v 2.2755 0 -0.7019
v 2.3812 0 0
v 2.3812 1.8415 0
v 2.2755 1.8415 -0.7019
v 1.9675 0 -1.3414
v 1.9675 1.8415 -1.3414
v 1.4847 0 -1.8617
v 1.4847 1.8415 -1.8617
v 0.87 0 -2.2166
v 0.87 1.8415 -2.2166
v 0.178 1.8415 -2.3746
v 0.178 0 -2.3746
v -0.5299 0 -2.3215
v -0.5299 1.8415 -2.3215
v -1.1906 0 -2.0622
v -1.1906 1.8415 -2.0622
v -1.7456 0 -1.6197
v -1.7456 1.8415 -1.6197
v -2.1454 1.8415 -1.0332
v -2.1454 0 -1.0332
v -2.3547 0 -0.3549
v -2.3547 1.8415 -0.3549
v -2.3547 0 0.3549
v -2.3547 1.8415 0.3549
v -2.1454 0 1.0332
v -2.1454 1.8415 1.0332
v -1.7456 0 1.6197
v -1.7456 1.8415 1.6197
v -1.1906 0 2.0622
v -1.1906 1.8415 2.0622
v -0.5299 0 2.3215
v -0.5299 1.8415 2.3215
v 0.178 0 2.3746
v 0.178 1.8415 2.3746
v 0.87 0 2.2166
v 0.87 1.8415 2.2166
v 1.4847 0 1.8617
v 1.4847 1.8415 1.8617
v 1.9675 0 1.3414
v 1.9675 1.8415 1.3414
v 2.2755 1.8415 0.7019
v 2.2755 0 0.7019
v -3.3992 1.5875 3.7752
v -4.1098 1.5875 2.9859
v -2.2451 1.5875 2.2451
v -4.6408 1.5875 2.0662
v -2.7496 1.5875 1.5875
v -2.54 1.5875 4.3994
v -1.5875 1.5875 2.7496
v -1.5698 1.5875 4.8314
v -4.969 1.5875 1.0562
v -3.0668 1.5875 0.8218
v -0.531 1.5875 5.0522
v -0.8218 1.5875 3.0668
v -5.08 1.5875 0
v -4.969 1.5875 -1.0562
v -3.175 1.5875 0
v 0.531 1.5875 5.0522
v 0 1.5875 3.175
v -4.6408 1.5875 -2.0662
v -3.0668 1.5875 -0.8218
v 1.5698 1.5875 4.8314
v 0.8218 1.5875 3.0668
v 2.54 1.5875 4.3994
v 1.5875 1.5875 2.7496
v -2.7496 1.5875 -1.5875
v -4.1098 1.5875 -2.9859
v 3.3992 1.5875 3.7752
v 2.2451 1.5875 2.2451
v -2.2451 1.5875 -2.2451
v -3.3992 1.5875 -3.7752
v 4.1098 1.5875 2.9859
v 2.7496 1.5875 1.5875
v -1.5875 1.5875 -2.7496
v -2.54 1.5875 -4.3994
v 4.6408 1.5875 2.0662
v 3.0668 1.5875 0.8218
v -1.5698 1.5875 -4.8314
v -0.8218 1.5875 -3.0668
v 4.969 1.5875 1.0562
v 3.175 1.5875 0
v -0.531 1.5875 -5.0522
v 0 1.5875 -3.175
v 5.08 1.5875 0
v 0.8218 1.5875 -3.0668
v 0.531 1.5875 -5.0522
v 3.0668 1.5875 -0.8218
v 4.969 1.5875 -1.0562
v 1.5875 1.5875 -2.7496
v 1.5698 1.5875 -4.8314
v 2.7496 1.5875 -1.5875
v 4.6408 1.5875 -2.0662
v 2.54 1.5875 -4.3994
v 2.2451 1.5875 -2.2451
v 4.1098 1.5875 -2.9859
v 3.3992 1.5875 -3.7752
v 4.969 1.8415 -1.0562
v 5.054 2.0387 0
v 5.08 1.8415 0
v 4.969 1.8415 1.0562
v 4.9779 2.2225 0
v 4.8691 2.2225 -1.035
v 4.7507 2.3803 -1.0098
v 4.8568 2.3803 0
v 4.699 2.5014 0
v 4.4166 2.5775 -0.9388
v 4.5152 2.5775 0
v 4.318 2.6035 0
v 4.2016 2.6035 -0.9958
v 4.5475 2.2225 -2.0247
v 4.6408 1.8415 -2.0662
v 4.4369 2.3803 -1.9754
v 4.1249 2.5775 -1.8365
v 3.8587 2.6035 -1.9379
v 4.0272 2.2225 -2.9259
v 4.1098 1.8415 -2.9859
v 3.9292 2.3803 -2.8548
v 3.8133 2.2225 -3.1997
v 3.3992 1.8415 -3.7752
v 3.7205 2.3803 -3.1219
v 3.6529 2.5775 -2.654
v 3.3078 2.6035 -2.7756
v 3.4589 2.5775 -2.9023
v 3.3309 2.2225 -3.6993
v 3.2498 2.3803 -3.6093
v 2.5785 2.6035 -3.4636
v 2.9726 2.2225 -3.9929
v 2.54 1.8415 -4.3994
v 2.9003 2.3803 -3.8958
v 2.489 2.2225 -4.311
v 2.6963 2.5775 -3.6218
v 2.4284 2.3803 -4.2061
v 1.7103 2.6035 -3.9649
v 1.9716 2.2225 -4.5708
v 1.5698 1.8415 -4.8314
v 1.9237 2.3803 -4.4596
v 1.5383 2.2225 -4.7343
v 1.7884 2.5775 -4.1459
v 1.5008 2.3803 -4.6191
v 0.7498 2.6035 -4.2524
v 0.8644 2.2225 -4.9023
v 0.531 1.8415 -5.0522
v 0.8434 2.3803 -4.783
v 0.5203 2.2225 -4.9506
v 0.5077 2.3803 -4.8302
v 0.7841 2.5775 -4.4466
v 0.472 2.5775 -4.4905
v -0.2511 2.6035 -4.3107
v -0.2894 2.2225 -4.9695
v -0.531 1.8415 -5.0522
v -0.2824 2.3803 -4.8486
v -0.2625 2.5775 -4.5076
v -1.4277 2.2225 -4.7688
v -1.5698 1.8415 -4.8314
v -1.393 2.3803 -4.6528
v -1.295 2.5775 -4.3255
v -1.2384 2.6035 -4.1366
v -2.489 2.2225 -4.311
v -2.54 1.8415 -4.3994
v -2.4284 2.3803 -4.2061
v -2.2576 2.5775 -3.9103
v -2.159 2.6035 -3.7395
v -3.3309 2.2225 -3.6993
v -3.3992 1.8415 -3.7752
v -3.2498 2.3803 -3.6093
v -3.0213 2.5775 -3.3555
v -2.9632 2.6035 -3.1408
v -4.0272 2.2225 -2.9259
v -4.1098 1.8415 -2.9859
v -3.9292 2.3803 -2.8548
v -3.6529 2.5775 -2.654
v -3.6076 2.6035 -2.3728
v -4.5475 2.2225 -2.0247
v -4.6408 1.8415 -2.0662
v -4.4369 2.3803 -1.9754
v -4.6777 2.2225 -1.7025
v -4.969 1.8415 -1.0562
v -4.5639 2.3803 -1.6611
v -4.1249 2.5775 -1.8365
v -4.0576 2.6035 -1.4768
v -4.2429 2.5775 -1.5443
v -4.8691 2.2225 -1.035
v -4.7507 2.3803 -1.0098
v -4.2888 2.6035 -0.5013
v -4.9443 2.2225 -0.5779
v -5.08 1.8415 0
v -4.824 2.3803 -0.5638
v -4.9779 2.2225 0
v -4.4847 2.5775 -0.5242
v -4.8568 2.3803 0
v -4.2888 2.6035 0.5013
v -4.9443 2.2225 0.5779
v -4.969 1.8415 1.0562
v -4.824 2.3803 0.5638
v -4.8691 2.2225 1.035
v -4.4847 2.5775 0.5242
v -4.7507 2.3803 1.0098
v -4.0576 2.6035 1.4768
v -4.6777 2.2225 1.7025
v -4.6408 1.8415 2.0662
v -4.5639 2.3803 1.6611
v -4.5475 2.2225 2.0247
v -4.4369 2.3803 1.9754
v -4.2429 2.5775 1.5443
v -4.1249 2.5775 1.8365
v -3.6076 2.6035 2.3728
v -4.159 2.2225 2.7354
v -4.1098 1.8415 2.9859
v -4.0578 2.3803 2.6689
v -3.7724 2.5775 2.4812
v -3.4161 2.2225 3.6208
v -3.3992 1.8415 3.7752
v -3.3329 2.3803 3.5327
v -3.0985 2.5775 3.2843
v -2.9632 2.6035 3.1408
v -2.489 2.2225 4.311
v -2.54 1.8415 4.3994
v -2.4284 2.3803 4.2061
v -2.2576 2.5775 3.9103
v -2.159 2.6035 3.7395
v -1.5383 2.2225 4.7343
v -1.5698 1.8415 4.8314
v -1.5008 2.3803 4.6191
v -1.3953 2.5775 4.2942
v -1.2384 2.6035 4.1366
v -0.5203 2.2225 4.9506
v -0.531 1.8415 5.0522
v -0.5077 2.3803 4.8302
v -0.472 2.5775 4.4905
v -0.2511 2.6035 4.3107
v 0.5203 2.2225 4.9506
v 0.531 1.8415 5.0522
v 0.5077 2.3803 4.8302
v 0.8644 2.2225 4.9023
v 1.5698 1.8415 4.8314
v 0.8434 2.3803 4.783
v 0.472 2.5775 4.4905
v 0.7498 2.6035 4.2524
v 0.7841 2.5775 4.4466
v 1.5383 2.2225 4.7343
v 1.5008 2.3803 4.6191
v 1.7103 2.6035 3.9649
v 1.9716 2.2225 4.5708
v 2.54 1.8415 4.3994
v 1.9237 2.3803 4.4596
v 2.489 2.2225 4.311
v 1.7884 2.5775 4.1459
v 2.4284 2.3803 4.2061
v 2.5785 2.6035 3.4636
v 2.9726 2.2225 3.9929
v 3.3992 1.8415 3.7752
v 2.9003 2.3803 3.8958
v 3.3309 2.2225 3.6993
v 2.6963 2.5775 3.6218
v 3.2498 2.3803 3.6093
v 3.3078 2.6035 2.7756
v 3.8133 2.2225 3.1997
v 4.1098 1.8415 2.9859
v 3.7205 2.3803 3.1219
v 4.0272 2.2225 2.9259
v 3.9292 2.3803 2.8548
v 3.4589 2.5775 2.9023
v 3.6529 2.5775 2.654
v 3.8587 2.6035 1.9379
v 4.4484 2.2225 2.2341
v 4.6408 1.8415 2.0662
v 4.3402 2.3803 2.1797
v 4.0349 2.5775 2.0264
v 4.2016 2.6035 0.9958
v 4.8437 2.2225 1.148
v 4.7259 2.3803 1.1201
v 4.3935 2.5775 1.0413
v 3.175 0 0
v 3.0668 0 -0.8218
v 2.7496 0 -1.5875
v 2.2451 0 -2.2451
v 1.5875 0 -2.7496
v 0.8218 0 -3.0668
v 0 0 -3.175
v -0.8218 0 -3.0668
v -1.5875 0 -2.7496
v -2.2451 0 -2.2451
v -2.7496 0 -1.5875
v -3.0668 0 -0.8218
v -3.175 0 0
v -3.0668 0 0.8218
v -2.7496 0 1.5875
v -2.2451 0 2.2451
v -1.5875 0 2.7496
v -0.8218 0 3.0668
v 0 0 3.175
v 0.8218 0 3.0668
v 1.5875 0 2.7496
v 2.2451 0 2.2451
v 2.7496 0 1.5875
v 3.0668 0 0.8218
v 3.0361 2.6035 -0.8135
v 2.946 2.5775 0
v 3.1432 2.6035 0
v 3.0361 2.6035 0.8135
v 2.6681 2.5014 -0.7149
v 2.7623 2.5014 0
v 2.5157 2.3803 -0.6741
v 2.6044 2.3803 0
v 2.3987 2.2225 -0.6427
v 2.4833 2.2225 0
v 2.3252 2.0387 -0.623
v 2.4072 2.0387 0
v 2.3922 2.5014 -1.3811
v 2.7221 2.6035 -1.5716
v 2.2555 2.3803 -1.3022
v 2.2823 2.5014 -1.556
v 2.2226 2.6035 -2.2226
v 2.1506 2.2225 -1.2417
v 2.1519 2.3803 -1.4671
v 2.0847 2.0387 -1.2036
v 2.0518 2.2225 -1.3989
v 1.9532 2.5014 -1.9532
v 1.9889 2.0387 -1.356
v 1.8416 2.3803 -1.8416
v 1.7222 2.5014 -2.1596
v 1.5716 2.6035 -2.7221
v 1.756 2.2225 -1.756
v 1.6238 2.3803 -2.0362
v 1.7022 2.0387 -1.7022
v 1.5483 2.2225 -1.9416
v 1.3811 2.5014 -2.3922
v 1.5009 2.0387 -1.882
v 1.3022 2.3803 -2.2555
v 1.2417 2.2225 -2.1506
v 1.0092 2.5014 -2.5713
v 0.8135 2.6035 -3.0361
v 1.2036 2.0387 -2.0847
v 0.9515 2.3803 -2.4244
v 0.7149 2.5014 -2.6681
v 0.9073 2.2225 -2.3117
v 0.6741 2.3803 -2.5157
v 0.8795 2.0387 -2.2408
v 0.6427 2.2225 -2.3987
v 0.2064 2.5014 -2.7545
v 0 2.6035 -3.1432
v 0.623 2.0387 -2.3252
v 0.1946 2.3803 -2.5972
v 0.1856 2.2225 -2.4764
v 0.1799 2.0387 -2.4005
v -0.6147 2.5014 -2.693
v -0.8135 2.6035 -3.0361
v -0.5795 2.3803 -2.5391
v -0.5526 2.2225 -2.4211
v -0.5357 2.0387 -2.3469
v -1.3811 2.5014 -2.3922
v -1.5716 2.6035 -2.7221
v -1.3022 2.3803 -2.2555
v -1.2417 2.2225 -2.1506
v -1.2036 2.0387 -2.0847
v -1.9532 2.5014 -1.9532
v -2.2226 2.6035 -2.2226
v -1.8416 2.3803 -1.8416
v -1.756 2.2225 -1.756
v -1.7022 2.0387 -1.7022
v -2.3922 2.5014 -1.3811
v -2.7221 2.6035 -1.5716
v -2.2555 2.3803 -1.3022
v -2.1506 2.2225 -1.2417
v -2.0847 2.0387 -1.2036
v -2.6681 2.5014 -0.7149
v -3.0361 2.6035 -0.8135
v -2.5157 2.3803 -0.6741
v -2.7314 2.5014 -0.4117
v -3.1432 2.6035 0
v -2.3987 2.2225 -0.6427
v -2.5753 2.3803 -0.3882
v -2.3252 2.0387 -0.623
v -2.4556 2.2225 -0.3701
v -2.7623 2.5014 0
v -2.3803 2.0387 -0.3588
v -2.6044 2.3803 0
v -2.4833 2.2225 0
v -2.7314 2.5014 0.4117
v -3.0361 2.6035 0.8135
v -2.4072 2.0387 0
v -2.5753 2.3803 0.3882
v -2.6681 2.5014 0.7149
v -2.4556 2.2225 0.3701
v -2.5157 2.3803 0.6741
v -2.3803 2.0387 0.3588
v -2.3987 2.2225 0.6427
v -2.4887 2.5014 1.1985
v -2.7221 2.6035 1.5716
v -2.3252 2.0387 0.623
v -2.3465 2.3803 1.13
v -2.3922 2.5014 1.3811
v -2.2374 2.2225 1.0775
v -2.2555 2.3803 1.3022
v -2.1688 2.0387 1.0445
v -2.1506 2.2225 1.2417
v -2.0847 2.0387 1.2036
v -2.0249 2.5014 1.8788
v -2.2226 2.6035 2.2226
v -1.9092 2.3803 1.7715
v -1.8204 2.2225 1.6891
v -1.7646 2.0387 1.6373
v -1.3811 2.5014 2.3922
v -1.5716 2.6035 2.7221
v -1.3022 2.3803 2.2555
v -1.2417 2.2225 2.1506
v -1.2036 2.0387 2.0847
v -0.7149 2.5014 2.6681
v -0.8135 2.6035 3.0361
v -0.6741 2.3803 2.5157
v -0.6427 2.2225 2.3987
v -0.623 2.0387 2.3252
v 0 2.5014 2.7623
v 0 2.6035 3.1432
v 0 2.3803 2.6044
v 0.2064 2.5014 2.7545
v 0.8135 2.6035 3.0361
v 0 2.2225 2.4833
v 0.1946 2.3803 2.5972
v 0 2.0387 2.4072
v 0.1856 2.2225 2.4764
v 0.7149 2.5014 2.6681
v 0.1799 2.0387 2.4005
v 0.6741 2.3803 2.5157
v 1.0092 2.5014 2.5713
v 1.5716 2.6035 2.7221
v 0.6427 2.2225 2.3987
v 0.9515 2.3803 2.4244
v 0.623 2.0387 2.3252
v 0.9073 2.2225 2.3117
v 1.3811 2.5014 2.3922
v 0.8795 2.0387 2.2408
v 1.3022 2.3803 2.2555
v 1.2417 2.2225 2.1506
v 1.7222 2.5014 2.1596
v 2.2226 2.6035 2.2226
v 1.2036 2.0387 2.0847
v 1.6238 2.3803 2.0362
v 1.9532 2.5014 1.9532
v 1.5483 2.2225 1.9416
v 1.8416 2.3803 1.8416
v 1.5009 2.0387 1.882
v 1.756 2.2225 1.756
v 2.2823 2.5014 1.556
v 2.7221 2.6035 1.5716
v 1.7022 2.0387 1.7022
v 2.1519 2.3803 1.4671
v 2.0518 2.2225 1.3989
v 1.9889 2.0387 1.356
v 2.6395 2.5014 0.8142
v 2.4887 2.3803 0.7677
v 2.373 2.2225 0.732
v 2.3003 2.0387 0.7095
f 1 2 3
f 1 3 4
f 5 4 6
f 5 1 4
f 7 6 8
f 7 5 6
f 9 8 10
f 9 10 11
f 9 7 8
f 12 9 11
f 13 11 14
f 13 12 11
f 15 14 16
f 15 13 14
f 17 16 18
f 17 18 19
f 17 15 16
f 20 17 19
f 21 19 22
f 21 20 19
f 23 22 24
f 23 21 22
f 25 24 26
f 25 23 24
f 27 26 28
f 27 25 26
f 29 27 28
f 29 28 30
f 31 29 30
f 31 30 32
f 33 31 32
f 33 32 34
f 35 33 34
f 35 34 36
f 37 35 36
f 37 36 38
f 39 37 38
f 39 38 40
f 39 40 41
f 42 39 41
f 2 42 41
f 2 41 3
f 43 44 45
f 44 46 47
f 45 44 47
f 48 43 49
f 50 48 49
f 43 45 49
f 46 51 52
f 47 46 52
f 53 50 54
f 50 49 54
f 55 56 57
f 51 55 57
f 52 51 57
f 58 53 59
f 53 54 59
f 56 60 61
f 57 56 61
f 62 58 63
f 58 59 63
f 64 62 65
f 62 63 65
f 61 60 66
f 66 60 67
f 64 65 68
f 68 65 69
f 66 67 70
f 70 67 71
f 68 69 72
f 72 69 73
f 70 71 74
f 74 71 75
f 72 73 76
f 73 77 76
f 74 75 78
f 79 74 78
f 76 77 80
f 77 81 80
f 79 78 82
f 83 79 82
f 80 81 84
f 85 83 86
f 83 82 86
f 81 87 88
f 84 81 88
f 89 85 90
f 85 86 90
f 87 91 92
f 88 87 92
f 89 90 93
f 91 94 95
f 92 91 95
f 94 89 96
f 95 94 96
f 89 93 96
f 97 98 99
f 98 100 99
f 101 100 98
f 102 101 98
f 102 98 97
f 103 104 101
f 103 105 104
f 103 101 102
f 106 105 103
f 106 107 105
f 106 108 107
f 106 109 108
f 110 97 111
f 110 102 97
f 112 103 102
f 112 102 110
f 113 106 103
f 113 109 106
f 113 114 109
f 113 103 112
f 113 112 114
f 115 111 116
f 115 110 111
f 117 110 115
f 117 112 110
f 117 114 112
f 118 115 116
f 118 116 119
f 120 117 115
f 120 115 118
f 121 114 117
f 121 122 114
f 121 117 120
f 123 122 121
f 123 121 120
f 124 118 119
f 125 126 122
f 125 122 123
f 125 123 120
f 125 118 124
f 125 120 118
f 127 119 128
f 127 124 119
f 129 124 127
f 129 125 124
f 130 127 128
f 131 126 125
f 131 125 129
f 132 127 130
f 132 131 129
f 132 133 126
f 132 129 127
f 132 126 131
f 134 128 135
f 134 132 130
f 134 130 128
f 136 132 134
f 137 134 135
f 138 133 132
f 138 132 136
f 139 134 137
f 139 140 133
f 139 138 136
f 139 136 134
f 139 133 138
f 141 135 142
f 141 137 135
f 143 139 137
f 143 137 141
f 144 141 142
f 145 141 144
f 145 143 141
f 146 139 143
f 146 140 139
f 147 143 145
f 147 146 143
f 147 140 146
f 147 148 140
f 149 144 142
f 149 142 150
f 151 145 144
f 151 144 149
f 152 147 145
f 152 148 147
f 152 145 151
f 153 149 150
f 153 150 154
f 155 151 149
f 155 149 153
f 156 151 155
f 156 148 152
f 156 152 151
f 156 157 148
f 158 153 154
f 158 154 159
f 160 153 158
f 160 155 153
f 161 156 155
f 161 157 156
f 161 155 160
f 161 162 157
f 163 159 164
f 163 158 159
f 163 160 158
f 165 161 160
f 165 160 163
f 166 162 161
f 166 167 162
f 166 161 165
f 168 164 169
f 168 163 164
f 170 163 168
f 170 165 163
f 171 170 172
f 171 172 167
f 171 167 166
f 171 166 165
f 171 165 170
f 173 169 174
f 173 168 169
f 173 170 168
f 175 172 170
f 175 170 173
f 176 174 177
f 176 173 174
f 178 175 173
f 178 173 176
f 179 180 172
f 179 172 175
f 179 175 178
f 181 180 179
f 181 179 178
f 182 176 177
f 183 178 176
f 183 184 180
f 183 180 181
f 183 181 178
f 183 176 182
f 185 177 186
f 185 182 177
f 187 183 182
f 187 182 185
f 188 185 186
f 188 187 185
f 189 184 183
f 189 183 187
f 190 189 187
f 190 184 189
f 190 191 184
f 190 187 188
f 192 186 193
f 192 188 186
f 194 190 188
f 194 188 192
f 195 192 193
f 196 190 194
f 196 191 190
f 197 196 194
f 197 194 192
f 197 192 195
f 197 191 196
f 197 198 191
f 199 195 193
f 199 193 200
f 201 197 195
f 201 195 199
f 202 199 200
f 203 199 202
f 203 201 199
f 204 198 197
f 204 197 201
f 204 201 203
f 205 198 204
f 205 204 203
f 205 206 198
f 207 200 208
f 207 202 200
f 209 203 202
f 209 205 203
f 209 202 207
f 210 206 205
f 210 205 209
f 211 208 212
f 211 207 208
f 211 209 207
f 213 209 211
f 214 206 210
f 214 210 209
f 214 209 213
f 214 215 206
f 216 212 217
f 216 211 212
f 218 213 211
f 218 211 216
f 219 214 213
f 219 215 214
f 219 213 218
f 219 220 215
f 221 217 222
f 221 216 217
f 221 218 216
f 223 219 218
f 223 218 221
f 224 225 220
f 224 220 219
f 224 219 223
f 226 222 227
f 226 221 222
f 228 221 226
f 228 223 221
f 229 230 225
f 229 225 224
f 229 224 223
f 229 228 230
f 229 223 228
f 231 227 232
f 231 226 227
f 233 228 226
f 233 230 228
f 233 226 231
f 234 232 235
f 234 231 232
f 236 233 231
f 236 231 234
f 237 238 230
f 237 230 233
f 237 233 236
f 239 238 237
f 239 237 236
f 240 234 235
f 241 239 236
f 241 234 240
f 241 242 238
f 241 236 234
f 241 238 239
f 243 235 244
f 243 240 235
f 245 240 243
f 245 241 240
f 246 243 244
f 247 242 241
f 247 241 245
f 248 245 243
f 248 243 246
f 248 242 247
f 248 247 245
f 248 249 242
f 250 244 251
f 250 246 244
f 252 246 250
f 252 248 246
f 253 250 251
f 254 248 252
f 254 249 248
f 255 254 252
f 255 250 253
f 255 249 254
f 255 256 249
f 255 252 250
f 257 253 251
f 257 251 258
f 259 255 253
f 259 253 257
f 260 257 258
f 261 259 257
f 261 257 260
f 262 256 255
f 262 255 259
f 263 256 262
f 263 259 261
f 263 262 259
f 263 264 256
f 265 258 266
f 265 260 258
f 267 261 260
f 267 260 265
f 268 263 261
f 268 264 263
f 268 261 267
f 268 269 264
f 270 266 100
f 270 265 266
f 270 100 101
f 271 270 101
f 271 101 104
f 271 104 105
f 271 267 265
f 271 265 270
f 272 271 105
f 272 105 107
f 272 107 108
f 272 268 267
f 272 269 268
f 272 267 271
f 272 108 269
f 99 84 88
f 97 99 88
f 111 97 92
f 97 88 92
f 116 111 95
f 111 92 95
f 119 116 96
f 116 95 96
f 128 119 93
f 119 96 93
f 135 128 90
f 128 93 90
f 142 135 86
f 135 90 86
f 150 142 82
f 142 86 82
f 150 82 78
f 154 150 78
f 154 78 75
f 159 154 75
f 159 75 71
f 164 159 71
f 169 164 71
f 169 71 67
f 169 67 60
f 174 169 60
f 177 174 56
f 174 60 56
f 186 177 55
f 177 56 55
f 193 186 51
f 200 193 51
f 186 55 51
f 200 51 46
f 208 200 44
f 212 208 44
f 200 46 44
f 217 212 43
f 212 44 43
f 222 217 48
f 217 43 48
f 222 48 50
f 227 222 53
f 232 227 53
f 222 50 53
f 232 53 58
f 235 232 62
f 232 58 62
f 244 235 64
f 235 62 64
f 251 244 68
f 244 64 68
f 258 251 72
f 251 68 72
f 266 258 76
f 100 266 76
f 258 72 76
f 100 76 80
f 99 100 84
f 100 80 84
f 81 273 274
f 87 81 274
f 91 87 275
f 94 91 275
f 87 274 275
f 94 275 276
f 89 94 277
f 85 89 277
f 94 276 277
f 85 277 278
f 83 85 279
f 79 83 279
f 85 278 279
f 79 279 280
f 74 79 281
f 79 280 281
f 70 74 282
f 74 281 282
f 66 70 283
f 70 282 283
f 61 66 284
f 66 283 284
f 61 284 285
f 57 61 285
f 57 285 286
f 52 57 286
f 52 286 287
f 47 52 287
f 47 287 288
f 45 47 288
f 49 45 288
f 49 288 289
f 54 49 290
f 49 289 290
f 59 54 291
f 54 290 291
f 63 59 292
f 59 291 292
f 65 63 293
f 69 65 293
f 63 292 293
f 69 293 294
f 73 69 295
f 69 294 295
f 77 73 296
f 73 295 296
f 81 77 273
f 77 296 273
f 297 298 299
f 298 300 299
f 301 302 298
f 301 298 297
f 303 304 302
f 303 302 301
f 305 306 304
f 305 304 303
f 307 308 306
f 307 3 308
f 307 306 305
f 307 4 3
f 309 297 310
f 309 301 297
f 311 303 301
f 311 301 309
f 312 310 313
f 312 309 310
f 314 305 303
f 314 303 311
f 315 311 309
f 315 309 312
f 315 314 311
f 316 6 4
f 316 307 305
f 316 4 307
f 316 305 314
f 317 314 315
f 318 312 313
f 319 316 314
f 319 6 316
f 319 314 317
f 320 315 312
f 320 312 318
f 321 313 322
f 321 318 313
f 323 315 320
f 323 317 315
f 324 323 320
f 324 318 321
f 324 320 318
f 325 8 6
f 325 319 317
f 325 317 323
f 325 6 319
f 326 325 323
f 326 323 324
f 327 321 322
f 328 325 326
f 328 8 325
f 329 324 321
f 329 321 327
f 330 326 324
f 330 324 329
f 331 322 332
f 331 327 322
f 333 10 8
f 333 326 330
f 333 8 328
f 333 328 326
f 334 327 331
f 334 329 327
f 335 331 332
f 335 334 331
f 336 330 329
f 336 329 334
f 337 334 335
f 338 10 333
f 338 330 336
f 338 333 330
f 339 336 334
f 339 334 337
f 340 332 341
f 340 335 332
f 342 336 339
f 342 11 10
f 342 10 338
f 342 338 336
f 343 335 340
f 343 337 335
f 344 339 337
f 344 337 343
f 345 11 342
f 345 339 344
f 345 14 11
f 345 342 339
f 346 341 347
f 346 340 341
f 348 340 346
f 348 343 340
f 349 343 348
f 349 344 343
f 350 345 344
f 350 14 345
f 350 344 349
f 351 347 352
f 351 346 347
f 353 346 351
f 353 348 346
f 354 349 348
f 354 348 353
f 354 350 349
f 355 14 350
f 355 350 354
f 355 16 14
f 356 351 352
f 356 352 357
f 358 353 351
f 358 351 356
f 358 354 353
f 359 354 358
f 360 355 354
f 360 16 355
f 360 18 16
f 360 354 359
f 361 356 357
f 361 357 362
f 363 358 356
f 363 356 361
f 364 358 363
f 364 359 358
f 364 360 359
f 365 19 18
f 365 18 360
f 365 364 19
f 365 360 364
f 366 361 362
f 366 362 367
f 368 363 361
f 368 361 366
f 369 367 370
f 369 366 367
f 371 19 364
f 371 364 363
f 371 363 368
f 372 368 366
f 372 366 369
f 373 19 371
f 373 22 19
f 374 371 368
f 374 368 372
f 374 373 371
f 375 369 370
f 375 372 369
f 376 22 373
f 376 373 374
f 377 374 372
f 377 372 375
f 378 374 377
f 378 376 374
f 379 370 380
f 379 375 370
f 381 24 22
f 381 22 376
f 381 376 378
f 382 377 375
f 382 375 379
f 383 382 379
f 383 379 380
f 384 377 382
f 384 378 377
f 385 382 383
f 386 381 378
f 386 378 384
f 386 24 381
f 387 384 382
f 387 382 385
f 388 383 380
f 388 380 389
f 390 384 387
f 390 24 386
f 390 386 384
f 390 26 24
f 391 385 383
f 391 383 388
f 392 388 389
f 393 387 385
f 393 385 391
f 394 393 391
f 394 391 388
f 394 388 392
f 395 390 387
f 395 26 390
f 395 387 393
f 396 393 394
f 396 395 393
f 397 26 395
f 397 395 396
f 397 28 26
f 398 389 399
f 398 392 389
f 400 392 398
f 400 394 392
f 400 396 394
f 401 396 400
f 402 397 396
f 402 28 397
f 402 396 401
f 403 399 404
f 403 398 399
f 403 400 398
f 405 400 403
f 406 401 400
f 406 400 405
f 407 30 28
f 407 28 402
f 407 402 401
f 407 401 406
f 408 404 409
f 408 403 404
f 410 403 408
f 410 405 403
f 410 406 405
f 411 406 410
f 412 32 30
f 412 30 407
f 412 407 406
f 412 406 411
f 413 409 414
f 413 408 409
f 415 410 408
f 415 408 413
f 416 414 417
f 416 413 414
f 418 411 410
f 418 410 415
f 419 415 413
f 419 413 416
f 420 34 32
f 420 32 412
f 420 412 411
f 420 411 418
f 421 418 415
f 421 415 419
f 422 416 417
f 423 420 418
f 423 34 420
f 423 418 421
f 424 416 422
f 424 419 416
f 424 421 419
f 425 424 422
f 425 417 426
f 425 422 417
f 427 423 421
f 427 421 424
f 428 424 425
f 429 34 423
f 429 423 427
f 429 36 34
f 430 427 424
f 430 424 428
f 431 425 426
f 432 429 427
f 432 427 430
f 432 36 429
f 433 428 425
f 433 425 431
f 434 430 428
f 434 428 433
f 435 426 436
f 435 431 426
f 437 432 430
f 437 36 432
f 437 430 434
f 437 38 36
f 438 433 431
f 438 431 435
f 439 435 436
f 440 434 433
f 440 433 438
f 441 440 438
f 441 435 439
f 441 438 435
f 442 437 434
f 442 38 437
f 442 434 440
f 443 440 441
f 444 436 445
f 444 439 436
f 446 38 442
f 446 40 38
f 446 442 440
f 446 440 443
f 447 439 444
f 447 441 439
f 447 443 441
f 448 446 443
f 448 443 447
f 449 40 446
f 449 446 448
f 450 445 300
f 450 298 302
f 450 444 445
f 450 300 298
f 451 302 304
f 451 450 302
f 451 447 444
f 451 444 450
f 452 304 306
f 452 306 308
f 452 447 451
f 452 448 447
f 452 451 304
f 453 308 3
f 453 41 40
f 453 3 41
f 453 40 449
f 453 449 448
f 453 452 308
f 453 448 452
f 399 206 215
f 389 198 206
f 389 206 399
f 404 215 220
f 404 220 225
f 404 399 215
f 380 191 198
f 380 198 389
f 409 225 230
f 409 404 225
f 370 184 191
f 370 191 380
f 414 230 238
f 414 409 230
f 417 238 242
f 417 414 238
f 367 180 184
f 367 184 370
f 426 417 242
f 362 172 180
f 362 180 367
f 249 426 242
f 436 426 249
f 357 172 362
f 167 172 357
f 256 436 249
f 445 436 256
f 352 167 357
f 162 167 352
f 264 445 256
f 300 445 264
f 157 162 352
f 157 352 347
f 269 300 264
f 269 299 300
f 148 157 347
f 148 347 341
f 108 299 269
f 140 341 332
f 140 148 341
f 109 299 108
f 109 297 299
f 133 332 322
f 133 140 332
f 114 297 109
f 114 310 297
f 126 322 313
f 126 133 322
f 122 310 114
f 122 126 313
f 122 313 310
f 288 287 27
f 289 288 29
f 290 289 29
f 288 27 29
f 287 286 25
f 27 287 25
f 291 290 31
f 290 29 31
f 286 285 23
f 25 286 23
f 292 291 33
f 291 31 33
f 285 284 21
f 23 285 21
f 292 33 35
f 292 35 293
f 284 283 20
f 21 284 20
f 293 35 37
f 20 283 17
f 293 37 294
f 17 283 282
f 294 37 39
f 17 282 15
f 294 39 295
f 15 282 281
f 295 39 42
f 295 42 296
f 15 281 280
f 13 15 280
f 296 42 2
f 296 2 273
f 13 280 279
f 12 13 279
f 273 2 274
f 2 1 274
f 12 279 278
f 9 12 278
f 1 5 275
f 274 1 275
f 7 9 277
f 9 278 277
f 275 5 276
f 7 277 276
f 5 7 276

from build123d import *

# Parameters (mm, degrees)
SKETCH1_R           = 3.175
SKETCH1_R_2         = 2.38125
BOSS_EXTRUDE1_DEPTH = 1.5875
SKETCH2_R           = 5.08
SKETCH2_R_2         = 2.38125
BOSS_EXTRUDE2_DEPTH = 1.016
FILLET1_R           = 0.762


with BuildPart() as part:
    # Sketch1 → Boss-Extrude1 (new body)
    with BuildSketch(Plane(origin=(0, 0, 0), x_dir=(1, 0, 0), z_dir=(0, 1, 0))):
        Circle(SKETCH1_R)
        Circle(SKETCH1_R_2, mode=Mode.SUBTRACT)
    extrude(amount=BOSS_EXTRUDE1_DEPTH)

    # Sketch2 → Boss-Extrude2 (add)
    with BuildSketch(Plane(origin=(0, 1.5875, 0), x_dir=(1, 0, 0), z_dir=(0, 1, 0))):
        Circle(SKETCH2_R)
        Circle(SKETCH2_R_2, mode=Mode.SUBTRACT)
    extrude(amount=BOSS_EXTRUDE2_DEPTH)

    # Fillet1
    fillet1_edges = [part.edges().sort_by_distance(p)[0] for p in [
        (-2.38125, 2.6035, 0),
        (-5.08, 2.6035, 0),
    ]]
    fillet(fillet1_edges, radius=FILLET1_R)


solid = part.part
